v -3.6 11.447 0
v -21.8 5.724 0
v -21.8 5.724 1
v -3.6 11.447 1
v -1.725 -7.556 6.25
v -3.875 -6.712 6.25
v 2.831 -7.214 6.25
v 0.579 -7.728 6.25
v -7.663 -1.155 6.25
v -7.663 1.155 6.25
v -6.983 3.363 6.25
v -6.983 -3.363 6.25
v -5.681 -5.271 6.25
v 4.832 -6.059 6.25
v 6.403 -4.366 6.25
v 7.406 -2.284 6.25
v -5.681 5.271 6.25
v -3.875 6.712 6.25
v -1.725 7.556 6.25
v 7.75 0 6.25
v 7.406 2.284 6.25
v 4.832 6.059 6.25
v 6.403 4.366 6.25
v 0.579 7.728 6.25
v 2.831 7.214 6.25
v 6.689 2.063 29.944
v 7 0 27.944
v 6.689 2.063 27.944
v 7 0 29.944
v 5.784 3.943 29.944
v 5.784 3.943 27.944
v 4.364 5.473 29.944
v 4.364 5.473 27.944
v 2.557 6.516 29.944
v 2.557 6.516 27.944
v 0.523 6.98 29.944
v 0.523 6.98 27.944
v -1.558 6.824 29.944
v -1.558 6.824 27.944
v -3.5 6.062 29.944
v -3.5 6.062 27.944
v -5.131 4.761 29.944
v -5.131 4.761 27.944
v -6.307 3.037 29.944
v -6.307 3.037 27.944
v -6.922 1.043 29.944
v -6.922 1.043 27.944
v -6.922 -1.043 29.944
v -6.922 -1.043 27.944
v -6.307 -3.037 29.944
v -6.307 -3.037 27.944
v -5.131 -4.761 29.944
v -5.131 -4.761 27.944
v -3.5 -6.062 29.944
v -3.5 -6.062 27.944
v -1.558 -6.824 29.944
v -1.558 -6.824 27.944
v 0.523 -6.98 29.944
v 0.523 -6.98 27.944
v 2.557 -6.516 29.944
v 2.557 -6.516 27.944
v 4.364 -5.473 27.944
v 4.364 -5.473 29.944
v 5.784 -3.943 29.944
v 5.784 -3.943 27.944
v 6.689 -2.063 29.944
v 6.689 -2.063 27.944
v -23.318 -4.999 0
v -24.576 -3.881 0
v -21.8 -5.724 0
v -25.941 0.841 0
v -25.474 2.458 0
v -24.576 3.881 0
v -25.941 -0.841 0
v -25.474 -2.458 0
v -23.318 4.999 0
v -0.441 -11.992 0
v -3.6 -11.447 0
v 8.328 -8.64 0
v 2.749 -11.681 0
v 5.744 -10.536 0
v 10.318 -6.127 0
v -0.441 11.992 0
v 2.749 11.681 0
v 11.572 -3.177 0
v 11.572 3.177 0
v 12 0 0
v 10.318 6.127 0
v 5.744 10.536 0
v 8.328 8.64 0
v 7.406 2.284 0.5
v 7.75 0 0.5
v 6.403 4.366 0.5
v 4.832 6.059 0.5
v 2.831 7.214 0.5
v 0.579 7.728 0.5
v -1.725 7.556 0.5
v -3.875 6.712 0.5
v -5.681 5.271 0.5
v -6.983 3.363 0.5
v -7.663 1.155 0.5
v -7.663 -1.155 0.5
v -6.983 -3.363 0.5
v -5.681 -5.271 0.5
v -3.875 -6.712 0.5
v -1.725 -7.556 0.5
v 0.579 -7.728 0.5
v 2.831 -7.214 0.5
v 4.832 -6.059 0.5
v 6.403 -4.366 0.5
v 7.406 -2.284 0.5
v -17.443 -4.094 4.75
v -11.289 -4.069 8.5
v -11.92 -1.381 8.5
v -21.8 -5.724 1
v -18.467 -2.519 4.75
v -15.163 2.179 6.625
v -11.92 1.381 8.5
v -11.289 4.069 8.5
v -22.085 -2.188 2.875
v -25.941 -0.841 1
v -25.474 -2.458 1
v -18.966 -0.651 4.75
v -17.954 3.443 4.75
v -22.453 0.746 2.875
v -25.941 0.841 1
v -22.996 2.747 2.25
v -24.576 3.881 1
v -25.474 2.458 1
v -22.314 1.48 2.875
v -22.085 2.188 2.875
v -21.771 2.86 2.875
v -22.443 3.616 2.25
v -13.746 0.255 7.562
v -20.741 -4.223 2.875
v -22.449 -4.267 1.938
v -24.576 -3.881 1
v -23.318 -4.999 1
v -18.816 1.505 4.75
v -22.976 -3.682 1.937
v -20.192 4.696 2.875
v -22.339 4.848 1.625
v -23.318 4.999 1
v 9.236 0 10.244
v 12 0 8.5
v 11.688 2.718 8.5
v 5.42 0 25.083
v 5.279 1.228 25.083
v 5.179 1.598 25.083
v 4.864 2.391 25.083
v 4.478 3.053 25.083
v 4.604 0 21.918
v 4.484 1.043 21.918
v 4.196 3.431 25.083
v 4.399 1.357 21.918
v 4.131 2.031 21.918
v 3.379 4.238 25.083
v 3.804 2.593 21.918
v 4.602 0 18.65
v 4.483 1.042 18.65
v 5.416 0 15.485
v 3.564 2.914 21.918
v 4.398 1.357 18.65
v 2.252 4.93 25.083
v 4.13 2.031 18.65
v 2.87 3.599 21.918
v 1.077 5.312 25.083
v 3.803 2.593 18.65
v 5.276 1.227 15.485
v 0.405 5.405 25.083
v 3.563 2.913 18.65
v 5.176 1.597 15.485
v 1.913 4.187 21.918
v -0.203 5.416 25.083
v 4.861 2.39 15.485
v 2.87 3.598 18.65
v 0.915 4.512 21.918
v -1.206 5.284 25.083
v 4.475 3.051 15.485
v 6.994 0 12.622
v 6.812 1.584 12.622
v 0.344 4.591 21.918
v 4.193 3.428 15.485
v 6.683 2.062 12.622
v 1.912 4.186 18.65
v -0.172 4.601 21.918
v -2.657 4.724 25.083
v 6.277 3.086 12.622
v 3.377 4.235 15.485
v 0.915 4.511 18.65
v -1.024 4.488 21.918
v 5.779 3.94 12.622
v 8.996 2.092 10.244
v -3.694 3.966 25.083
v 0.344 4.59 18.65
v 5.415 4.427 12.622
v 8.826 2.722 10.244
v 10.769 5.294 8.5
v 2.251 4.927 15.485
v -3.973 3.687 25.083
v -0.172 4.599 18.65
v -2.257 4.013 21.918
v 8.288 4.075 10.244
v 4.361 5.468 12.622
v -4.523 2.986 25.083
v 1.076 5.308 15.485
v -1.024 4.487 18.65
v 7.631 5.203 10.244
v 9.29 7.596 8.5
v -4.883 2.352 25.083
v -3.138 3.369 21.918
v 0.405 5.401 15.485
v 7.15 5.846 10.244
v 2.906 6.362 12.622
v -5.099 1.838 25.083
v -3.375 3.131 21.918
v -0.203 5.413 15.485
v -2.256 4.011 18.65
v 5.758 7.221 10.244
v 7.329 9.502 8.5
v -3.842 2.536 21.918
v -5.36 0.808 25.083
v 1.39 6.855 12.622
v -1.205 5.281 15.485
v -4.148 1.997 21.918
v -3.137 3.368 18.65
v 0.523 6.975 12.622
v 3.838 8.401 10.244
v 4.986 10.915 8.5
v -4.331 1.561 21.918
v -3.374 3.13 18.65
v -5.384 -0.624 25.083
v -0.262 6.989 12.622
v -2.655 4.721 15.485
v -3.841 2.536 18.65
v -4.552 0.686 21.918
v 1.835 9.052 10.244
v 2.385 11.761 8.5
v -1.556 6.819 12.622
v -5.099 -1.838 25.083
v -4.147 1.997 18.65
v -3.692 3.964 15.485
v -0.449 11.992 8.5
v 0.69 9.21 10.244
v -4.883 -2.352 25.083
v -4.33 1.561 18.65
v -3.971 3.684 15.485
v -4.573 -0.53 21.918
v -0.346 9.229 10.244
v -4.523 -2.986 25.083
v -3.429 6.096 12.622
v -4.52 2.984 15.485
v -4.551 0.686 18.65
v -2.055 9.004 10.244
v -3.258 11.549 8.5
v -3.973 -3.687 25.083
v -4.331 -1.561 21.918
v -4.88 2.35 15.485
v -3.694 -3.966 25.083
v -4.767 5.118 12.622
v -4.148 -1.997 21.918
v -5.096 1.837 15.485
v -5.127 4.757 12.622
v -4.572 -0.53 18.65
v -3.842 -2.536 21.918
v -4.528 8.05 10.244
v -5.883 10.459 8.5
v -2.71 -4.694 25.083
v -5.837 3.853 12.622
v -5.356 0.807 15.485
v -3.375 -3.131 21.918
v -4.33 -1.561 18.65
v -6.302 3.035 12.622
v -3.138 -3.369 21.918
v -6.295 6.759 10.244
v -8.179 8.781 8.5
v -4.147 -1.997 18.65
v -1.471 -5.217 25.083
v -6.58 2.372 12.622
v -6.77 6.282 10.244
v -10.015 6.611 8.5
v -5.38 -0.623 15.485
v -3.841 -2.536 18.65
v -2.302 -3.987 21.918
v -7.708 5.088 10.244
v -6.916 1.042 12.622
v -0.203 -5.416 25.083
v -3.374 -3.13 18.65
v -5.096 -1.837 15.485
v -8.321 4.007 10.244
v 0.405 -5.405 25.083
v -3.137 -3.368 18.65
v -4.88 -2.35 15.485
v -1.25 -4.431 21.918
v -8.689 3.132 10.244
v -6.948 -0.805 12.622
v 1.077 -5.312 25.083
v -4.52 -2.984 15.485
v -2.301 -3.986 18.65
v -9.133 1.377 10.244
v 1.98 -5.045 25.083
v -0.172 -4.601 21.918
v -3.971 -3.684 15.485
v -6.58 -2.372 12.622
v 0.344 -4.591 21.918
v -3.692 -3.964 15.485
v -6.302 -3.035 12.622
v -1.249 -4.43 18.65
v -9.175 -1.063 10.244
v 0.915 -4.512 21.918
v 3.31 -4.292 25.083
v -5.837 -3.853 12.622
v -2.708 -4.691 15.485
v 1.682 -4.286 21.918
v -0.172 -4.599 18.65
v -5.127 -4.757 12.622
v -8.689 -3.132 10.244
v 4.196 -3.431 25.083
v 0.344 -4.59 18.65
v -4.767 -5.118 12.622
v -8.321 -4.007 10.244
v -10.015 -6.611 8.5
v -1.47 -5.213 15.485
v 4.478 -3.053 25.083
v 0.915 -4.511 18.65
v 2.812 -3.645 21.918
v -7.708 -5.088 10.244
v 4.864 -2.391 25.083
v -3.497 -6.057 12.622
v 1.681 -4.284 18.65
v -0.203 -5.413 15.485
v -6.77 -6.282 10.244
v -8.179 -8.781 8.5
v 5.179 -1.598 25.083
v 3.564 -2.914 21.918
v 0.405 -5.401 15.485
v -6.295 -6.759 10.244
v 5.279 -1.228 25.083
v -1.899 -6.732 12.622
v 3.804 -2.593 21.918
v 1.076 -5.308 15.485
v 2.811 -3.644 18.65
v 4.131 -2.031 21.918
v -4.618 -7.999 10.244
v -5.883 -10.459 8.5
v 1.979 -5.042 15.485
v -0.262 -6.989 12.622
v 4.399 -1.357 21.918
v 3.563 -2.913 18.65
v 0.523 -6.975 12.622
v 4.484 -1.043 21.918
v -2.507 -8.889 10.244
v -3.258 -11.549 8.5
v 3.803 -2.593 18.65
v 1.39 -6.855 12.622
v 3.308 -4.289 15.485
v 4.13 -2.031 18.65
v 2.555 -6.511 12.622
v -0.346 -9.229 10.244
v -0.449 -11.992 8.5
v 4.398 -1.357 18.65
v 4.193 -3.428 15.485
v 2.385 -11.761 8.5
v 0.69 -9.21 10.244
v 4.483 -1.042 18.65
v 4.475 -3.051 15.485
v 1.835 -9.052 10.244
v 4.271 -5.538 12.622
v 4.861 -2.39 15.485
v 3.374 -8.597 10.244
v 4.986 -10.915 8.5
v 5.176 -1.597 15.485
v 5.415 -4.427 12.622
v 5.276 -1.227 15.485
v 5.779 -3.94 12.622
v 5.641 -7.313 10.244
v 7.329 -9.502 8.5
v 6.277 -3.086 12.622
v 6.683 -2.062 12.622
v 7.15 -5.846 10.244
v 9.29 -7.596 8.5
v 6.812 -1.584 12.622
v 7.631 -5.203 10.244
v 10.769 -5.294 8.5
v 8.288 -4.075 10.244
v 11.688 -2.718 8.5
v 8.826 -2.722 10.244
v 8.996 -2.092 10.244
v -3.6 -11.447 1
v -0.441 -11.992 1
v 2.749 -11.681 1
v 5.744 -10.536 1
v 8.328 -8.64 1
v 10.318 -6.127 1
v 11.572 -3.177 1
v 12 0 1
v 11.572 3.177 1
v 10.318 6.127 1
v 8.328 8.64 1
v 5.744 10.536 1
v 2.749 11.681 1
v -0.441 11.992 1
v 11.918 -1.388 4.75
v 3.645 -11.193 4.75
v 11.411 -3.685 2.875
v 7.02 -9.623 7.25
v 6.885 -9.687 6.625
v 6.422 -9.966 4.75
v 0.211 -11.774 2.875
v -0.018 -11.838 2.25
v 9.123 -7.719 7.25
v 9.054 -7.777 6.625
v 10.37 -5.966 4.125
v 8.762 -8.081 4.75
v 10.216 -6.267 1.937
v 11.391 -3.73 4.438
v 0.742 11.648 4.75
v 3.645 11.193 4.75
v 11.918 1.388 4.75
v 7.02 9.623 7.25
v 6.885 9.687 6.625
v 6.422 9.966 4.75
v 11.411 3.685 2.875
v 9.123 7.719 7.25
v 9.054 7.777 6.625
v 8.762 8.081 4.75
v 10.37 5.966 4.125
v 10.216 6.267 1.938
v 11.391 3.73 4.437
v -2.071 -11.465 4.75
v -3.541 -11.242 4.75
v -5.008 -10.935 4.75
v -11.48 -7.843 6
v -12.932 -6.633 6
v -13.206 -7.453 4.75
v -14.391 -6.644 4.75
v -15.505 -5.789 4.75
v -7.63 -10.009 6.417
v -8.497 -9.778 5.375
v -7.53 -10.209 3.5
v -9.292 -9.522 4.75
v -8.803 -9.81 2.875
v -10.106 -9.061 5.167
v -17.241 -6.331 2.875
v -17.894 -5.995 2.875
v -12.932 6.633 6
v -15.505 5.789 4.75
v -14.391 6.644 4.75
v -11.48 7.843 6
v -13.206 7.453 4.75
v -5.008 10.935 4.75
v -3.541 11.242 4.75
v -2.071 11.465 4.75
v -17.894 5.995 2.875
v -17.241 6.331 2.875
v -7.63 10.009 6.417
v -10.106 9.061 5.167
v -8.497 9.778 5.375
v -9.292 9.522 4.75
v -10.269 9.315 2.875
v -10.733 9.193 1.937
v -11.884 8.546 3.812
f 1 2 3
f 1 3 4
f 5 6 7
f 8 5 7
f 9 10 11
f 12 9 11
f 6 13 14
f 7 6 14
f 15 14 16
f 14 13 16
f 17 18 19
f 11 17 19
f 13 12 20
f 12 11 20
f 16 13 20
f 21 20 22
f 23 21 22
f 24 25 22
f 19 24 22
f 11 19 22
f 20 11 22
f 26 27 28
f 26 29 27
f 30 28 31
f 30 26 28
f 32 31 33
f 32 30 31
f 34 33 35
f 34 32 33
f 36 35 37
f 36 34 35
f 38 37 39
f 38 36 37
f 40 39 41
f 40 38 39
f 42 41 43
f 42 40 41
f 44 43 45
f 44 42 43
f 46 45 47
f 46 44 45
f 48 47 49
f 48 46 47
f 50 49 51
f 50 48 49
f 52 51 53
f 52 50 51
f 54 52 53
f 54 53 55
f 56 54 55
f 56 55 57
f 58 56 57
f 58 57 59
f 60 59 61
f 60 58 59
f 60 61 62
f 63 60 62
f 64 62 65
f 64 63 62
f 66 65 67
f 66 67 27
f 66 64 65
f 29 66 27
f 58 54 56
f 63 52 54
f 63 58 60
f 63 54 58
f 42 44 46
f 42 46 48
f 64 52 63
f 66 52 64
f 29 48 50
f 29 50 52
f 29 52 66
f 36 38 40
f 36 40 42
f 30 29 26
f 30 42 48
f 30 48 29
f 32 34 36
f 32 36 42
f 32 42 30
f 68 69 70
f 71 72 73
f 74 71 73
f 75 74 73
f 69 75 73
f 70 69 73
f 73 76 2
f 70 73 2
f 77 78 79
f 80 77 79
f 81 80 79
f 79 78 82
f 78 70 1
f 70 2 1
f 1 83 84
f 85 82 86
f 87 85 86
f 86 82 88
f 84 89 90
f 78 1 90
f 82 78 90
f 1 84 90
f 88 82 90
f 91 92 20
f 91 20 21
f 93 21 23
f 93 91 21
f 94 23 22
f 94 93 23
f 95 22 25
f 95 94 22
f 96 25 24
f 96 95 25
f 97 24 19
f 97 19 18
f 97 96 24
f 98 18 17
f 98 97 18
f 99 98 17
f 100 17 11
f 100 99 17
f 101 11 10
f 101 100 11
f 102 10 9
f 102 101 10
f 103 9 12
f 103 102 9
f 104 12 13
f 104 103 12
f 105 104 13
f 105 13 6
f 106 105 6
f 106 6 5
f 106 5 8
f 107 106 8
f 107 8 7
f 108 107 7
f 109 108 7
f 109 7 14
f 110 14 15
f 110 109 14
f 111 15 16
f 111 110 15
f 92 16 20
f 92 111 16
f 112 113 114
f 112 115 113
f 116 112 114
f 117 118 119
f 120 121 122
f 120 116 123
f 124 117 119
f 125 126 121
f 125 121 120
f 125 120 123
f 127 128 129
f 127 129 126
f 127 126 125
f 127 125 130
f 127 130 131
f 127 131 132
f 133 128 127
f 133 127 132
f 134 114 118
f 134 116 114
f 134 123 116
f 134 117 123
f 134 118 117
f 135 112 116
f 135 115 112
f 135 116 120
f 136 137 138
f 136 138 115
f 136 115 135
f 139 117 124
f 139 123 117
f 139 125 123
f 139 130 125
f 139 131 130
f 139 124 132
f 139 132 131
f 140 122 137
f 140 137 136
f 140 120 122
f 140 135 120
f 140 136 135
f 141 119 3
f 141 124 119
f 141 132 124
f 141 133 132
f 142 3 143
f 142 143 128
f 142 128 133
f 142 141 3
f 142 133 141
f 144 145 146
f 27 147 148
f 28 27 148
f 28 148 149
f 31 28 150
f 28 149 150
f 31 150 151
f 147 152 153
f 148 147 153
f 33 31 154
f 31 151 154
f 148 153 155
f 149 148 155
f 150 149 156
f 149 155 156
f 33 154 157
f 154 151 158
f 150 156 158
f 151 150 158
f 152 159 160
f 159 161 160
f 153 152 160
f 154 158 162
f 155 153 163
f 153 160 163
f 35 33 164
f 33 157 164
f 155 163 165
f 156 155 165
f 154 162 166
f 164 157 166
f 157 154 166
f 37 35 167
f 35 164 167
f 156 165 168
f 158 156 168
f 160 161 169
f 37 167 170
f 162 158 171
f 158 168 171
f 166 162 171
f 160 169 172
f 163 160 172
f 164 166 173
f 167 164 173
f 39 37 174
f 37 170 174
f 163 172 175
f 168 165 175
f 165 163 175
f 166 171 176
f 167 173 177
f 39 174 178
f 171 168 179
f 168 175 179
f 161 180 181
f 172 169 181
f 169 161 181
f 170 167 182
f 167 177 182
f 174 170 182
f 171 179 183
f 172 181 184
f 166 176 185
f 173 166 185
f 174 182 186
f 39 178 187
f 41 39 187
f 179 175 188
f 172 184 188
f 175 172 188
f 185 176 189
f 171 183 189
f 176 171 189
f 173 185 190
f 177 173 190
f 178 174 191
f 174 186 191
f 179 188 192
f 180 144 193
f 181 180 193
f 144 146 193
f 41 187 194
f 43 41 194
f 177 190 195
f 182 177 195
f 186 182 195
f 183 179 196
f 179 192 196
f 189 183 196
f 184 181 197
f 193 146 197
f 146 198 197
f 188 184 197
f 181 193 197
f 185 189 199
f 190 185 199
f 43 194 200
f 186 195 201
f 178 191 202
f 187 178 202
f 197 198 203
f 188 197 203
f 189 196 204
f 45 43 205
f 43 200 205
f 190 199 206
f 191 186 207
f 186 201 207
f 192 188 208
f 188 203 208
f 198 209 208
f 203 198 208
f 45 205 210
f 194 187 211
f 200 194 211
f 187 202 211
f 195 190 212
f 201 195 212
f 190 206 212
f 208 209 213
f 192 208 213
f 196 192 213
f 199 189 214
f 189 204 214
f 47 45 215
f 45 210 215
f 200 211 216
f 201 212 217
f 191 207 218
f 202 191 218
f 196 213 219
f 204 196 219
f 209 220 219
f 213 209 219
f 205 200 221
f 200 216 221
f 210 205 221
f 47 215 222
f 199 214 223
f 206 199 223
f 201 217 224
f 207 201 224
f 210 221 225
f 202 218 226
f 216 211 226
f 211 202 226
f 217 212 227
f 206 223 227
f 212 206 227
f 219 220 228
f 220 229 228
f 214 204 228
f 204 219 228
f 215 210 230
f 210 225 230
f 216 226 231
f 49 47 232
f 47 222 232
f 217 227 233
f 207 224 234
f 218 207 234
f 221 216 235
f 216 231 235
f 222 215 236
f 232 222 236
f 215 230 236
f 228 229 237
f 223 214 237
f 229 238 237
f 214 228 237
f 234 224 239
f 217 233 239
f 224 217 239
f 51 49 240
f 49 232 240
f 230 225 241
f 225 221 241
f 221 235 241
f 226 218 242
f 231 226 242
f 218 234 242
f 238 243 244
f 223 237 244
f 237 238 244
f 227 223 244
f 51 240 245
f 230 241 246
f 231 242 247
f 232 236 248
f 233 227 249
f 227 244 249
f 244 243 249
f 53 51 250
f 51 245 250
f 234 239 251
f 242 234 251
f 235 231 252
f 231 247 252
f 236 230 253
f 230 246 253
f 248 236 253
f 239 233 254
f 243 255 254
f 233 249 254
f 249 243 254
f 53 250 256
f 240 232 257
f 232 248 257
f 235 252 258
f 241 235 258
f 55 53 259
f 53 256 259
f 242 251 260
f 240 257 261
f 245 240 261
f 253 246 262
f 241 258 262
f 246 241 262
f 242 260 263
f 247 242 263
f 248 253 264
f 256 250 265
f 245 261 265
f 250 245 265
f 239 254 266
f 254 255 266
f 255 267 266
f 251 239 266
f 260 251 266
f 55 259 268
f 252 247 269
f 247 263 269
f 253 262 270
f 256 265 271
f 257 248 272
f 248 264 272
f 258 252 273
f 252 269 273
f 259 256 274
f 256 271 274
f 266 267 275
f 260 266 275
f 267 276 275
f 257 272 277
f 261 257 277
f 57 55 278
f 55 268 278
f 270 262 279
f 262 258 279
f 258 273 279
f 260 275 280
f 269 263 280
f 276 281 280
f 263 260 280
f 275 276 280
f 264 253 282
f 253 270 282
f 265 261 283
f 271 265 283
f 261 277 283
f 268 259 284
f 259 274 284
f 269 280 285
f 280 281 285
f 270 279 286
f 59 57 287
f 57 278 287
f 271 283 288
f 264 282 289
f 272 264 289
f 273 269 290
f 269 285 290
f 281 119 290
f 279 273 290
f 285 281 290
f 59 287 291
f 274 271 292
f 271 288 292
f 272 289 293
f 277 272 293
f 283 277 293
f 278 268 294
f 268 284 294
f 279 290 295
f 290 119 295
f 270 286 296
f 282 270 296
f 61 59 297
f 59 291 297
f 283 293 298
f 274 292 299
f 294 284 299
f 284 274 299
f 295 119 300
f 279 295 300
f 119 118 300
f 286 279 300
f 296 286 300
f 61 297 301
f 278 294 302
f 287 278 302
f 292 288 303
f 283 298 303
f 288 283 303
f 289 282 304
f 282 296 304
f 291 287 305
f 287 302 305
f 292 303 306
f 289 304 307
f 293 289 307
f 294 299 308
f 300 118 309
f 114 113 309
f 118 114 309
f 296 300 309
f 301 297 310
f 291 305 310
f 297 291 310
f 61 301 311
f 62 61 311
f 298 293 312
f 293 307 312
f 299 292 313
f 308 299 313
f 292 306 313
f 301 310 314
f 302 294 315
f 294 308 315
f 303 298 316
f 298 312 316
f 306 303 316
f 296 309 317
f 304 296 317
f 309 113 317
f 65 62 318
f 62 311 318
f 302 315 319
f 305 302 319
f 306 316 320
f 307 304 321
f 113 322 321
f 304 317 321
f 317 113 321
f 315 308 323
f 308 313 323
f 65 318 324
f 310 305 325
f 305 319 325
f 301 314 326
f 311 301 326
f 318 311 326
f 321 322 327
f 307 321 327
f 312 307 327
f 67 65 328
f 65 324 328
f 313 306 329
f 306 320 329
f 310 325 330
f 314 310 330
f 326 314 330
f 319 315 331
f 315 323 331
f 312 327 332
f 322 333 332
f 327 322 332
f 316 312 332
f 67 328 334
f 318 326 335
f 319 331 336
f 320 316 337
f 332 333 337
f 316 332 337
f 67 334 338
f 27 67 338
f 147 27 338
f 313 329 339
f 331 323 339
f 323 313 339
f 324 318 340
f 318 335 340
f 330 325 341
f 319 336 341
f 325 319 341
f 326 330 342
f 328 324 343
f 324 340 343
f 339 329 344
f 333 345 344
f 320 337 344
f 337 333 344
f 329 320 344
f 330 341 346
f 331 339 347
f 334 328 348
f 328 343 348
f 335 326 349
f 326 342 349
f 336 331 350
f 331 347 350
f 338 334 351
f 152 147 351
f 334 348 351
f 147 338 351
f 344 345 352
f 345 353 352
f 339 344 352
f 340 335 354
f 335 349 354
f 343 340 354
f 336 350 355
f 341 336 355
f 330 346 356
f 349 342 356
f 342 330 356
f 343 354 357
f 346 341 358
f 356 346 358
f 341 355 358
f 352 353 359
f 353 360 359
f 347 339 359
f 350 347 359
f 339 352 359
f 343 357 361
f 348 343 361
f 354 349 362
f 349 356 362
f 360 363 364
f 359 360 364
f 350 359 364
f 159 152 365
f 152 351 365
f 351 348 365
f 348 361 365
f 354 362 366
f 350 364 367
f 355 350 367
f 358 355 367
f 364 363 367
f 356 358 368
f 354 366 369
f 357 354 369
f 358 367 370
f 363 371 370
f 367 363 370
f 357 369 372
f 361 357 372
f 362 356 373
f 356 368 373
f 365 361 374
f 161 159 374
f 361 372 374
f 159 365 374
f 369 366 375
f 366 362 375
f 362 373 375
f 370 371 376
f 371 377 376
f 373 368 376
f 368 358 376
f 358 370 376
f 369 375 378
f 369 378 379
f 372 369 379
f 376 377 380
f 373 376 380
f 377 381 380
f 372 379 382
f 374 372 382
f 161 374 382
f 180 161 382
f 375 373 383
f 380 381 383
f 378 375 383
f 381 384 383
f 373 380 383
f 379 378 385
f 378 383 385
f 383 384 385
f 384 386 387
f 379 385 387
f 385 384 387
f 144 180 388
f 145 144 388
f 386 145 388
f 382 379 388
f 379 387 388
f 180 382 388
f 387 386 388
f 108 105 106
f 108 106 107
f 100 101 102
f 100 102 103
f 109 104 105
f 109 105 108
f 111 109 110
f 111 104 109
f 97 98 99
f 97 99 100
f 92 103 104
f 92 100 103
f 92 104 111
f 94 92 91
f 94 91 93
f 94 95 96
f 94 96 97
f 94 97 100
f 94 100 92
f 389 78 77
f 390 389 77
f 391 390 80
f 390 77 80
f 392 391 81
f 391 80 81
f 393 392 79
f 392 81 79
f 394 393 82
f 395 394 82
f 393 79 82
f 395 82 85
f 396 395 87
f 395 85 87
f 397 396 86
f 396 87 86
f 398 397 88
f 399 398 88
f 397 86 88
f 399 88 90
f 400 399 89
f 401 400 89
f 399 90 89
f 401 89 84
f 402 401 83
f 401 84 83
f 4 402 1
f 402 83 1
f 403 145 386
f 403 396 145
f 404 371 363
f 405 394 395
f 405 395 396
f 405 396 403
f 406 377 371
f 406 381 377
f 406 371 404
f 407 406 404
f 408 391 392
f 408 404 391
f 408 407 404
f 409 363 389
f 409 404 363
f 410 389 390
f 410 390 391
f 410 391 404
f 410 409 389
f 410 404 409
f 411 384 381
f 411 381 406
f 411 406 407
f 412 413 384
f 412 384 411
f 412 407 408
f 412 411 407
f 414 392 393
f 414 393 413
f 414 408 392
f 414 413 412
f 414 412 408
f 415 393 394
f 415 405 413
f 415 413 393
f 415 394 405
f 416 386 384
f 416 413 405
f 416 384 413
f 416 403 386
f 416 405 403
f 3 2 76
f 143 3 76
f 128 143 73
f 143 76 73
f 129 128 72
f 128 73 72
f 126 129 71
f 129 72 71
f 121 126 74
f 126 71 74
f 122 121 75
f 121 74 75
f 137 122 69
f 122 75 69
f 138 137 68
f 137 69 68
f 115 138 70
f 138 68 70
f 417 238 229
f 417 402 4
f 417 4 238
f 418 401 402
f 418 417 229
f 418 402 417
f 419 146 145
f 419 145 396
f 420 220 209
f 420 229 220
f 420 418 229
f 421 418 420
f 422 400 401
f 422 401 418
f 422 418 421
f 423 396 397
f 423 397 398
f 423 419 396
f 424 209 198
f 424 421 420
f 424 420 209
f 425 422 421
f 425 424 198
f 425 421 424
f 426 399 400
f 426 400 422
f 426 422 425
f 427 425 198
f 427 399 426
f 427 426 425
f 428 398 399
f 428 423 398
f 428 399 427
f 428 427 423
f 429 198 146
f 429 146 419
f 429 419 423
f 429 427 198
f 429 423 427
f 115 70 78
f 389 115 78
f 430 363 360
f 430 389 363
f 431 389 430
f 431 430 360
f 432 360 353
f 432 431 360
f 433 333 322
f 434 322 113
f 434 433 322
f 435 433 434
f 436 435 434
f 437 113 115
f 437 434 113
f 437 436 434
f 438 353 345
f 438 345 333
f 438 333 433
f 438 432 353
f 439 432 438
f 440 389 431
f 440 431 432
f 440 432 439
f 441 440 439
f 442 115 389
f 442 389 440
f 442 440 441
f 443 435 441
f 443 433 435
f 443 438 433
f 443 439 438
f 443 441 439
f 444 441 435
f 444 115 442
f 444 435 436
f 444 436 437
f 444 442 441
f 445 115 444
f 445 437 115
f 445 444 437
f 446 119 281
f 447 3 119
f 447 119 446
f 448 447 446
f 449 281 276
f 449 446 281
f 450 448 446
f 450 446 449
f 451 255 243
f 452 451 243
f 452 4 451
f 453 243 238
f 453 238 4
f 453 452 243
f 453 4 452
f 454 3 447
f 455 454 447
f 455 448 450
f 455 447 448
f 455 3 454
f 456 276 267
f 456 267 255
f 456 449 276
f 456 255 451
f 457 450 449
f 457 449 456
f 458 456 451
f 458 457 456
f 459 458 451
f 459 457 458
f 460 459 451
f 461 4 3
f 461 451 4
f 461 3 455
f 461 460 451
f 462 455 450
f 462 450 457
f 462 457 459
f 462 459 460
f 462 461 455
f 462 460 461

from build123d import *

# Parameters (mm, degrees)
SKETCH002_R  = 12
PAD_DEPTH    = 1
SKETCH001_R  = 7.75
POCKET_DEPTH = 5.75


with BuildPart() as part:
    # Sketch → Revolution (revolve)
    with BuildSketch(Plane.XZ):
        with BuildLine():
            ThreePointArc((7, 27.944074), (4.909607, 17.041628), (12, 8.5))
            Line((12, 8.5), (0, 8.5))
            Line((0, 8.5), (0, 29.944074))
            Line((7, 29.944074), (0, 29.944074))
            Line((7, 27.944074), (7, 29.944074))
        make_face()
    revolve(axis=Axis((0, 0, 0), (0, 0, 1)))

    # Sketch002 (on DatumPlane) → AdditiveLoft section 0
    with BuildSketch(Plane(origin=(0, 0, 8.5), x_dir=(1, 0, 0), z_dir=(0, 0, -1))):
        Circle(SKETCH002_R)
    # Sketch004 → AdditiveLoft section 1
    with BuildSketch(Plane.XY.offset(1)):
        with BuildLine():
            ThreePointArc((-3.6, -11.44727), (12, 0), (-3.6, 11.44727))
            Line((-21.8, 5.723635), (-3.6, 11.44727))
            ThreePointArc((-21.8, 5.723635), (-26, 0), (-21.8, -5.723635))
            Line((-21.8, -5.723635), (-3.6, -11.44727))
        make_face()
    loft(ruled=True)

    # Sketch003 → Pad (new body)
    with BuildSketch(Plane.XY):
        with BuildLine():
            ThreePointArc((-3.6, -11.44727), (12, 0), (-3.6, 11.44727))
            Line((-21.8, 5.723635), (-3.6, 11.44727))
            ThreePointArc((-21.8, 5.723635), (-26, 0), (-21.8, -5.723635))
            Line((-21.8, -5.723635), (-3.6, -11.44727))
        make_face()
    extrude(amount=PAD_DEPTH)

    # Sketch001 → Pocket (cut)
    with BuildSketch(Plane.XY.offset(0.5)):
        Circle(SKETCH001_R)
    extrude(amount=POCKET_DEPTH, mode=Mode.SUBTRACT)


solid = part.part
